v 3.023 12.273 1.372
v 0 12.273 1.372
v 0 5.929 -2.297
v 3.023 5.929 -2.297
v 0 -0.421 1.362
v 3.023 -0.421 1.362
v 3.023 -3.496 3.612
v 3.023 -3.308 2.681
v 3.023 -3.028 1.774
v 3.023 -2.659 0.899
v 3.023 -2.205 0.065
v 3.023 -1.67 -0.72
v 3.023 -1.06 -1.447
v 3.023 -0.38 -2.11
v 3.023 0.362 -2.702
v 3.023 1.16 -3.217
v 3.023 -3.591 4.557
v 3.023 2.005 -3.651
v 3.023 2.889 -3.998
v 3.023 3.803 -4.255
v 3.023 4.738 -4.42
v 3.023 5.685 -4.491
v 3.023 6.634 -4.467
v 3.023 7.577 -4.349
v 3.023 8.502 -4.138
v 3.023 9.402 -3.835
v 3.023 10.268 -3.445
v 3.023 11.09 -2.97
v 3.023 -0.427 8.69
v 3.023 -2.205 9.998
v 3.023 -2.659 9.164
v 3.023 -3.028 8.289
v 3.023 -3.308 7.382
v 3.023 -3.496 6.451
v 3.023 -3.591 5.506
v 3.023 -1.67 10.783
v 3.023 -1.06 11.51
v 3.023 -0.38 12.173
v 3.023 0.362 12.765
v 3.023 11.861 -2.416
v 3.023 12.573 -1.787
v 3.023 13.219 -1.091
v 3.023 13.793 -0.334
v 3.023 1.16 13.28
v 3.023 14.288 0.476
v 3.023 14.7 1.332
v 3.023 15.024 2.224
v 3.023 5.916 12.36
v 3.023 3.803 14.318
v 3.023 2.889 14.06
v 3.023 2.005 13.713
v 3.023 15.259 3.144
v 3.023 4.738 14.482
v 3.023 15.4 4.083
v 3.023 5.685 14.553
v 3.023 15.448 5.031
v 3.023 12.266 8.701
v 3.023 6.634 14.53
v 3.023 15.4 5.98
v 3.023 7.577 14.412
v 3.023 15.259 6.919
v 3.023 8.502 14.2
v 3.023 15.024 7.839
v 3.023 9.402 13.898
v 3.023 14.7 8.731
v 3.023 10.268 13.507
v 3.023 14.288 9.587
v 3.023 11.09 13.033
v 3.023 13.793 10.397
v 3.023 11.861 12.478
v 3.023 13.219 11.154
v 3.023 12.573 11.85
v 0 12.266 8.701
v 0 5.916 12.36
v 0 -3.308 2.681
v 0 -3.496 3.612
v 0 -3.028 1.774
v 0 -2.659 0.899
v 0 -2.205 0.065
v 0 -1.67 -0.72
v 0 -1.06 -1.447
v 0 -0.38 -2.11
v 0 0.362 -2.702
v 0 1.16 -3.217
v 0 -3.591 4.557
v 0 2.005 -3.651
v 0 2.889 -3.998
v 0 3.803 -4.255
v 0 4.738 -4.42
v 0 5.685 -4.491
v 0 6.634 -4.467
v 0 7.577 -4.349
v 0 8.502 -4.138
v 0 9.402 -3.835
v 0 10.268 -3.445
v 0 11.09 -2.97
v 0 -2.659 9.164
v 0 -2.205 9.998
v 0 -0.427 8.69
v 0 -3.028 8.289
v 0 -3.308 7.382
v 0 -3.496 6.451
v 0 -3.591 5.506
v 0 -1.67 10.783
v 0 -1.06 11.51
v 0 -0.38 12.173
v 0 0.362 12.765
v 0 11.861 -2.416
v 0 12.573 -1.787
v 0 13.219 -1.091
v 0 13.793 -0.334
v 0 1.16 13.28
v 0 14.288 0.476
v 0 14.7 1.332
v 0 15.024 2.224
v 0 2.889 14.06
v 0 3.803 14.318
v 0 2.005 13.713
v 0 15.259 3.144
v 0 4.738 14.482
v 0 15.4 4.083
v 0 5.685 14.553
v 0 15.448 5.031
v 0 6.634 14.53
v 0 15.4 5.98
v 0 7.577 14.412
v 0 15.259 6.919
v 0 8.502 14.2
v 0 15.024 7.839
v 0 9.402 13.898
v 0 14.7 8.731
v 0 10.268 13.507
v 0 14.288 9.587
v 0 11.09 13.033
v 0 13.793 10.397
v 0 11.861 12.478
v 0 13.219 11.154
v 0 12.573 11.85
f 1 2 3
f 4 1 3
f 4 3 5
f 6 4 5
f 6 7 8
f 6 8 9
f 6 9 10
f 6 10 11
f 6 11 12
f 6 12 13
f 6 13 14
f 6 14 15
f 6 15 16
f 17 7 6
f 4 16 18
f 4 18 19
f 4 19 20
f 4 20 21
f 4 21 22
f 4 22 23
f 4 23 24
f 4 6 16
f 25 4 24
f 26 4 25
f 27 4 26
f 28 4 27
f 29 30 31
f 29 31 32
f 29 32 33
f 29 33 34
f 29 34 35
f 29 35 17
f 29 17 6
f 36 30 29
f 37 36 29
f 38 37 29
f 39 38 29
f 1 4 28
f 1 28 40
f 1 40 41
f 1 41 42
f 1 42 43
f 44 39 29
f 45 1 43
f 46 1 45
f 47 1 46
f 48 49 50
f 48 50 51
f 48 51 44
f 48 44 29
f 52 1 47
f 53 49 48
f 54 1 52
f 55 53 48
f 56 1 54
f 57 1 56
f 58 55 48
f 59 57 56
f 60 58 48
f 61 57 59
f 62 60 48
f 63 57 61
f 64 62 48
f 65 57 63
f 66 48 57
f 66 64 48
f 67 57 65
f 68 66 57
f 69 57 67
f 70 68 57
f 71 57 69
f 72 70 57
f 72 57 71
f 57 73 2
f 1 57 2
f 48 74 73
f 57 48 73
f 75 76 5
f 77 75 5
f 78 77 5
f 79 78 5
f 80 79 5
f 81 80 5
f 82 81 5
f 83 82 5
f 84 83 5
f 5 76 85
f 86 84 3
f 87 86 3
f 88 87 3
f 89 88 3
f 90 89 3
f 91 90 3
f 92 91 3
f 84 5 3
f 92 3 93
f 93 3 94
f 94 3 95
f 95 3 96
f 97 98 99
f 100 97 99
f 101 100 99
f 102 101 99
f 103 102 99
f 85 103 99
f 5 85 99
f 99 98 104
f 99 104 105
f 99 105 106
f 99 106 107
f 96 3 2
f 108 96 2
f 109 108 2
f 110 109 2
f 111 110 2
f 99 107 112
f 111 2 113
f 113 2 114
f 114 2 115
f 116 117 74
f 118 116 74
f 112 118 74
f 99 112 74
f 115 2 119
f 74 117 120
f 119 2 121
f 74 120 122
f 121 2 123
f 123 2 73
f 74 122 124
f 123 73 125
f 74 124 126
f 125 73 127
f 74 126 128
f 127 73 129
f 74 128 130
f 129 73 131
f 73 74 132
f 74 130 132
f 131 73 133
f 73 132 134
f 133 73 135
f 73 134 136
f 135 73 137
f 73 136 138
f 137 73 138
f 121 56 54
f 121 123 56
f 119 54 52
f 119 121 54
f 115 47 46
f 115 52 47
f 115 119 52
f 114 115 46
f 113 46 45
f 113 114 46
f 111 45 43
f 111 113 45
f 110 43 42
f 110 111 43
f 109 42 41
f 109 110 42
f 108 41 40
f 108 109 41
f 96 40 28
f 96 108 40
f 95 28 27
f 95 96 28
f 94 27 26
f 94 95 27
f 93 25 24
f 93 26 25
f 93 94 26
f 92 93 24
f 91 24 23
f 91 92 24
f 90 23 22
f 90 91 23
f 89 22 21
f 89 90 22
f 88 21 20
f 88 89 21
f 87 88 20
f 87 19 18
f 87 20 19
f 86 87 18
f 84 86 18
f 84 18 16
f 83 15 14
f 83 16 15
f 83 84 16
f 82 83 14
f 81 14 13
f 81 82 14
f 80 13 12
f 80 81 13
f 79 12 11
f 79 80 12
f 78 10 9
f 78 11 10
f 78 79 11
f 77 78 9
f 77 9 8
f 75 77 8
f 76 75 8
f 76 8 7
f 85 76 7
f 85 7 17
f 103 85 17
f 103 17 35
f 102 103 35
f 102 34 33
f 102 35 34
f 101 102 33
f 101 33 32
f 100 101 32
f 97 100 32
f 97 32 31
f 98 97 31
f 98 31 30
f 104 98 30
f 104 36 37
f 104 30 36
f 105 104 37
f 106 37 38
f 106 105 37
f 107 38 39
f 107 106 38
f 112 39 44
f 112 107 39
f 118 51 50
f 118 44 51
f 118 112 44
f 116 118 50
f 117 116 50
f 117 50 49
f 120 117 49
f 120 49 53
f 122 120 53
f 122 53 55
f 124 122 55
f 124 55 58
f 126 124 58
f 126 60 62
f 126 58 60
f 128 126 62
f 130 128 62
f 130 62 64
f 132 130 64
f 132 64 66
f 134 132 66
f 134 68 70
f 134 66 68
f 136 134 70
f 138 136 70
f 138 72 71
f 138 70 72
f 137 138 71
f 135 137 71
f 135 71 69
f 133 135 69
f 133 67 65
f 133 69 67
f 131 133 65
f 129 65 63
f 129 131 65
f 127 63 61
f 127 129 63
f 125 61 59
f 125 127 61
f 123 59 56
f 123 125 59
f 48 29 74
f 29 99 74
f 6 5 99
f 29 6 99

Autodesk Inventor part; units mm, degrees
ref_plane "YZ Plane" through (0, 0, 0) normal (1, 0, 0) x (0, 1, 0)
ref_plane "XZ Plane" through (0, 0, 0) normal (0, 1, 0) x (-1, 0, 0)
ref_plane "XY Plane" through (0, 0, 0) normal (0, 0, 1) x (1, 0, 0)
sketch "Sketch1" plane through (0, 0, 0) normal (1, 0, 0) x (0, 1, 0)
  circle A0 centre (5.9226, 5.0314) radius 9.525
  line L0 (5.9226, 5.0314) -> (12.2726, 5.0314) construction
  line L1 (12.2726, 1.3724) -> (5.9287, -2.2974)
  line L2 (5.9287, -2.2974) -> (-0.4213, 1.3617)
  line L3 (-0.4213, 1.3617) -> (-0.4274, 8.6905)
  line L4 (-0.4274, 8.6905) -> (5.9164, 12.3602)
  line L5 (5.9164, 12.3602) -> (12.2664, 8.7012)
  line L6 (12.2664, 8.7012) -> (12.2726, 1.3724)
  point P0 (0, 0)
  dimension "d0" = 19.05
extrude "Extrusion1" add sketch "Sketch1" along normal blind 3.0226
properties part number "3D Model Spacer"
